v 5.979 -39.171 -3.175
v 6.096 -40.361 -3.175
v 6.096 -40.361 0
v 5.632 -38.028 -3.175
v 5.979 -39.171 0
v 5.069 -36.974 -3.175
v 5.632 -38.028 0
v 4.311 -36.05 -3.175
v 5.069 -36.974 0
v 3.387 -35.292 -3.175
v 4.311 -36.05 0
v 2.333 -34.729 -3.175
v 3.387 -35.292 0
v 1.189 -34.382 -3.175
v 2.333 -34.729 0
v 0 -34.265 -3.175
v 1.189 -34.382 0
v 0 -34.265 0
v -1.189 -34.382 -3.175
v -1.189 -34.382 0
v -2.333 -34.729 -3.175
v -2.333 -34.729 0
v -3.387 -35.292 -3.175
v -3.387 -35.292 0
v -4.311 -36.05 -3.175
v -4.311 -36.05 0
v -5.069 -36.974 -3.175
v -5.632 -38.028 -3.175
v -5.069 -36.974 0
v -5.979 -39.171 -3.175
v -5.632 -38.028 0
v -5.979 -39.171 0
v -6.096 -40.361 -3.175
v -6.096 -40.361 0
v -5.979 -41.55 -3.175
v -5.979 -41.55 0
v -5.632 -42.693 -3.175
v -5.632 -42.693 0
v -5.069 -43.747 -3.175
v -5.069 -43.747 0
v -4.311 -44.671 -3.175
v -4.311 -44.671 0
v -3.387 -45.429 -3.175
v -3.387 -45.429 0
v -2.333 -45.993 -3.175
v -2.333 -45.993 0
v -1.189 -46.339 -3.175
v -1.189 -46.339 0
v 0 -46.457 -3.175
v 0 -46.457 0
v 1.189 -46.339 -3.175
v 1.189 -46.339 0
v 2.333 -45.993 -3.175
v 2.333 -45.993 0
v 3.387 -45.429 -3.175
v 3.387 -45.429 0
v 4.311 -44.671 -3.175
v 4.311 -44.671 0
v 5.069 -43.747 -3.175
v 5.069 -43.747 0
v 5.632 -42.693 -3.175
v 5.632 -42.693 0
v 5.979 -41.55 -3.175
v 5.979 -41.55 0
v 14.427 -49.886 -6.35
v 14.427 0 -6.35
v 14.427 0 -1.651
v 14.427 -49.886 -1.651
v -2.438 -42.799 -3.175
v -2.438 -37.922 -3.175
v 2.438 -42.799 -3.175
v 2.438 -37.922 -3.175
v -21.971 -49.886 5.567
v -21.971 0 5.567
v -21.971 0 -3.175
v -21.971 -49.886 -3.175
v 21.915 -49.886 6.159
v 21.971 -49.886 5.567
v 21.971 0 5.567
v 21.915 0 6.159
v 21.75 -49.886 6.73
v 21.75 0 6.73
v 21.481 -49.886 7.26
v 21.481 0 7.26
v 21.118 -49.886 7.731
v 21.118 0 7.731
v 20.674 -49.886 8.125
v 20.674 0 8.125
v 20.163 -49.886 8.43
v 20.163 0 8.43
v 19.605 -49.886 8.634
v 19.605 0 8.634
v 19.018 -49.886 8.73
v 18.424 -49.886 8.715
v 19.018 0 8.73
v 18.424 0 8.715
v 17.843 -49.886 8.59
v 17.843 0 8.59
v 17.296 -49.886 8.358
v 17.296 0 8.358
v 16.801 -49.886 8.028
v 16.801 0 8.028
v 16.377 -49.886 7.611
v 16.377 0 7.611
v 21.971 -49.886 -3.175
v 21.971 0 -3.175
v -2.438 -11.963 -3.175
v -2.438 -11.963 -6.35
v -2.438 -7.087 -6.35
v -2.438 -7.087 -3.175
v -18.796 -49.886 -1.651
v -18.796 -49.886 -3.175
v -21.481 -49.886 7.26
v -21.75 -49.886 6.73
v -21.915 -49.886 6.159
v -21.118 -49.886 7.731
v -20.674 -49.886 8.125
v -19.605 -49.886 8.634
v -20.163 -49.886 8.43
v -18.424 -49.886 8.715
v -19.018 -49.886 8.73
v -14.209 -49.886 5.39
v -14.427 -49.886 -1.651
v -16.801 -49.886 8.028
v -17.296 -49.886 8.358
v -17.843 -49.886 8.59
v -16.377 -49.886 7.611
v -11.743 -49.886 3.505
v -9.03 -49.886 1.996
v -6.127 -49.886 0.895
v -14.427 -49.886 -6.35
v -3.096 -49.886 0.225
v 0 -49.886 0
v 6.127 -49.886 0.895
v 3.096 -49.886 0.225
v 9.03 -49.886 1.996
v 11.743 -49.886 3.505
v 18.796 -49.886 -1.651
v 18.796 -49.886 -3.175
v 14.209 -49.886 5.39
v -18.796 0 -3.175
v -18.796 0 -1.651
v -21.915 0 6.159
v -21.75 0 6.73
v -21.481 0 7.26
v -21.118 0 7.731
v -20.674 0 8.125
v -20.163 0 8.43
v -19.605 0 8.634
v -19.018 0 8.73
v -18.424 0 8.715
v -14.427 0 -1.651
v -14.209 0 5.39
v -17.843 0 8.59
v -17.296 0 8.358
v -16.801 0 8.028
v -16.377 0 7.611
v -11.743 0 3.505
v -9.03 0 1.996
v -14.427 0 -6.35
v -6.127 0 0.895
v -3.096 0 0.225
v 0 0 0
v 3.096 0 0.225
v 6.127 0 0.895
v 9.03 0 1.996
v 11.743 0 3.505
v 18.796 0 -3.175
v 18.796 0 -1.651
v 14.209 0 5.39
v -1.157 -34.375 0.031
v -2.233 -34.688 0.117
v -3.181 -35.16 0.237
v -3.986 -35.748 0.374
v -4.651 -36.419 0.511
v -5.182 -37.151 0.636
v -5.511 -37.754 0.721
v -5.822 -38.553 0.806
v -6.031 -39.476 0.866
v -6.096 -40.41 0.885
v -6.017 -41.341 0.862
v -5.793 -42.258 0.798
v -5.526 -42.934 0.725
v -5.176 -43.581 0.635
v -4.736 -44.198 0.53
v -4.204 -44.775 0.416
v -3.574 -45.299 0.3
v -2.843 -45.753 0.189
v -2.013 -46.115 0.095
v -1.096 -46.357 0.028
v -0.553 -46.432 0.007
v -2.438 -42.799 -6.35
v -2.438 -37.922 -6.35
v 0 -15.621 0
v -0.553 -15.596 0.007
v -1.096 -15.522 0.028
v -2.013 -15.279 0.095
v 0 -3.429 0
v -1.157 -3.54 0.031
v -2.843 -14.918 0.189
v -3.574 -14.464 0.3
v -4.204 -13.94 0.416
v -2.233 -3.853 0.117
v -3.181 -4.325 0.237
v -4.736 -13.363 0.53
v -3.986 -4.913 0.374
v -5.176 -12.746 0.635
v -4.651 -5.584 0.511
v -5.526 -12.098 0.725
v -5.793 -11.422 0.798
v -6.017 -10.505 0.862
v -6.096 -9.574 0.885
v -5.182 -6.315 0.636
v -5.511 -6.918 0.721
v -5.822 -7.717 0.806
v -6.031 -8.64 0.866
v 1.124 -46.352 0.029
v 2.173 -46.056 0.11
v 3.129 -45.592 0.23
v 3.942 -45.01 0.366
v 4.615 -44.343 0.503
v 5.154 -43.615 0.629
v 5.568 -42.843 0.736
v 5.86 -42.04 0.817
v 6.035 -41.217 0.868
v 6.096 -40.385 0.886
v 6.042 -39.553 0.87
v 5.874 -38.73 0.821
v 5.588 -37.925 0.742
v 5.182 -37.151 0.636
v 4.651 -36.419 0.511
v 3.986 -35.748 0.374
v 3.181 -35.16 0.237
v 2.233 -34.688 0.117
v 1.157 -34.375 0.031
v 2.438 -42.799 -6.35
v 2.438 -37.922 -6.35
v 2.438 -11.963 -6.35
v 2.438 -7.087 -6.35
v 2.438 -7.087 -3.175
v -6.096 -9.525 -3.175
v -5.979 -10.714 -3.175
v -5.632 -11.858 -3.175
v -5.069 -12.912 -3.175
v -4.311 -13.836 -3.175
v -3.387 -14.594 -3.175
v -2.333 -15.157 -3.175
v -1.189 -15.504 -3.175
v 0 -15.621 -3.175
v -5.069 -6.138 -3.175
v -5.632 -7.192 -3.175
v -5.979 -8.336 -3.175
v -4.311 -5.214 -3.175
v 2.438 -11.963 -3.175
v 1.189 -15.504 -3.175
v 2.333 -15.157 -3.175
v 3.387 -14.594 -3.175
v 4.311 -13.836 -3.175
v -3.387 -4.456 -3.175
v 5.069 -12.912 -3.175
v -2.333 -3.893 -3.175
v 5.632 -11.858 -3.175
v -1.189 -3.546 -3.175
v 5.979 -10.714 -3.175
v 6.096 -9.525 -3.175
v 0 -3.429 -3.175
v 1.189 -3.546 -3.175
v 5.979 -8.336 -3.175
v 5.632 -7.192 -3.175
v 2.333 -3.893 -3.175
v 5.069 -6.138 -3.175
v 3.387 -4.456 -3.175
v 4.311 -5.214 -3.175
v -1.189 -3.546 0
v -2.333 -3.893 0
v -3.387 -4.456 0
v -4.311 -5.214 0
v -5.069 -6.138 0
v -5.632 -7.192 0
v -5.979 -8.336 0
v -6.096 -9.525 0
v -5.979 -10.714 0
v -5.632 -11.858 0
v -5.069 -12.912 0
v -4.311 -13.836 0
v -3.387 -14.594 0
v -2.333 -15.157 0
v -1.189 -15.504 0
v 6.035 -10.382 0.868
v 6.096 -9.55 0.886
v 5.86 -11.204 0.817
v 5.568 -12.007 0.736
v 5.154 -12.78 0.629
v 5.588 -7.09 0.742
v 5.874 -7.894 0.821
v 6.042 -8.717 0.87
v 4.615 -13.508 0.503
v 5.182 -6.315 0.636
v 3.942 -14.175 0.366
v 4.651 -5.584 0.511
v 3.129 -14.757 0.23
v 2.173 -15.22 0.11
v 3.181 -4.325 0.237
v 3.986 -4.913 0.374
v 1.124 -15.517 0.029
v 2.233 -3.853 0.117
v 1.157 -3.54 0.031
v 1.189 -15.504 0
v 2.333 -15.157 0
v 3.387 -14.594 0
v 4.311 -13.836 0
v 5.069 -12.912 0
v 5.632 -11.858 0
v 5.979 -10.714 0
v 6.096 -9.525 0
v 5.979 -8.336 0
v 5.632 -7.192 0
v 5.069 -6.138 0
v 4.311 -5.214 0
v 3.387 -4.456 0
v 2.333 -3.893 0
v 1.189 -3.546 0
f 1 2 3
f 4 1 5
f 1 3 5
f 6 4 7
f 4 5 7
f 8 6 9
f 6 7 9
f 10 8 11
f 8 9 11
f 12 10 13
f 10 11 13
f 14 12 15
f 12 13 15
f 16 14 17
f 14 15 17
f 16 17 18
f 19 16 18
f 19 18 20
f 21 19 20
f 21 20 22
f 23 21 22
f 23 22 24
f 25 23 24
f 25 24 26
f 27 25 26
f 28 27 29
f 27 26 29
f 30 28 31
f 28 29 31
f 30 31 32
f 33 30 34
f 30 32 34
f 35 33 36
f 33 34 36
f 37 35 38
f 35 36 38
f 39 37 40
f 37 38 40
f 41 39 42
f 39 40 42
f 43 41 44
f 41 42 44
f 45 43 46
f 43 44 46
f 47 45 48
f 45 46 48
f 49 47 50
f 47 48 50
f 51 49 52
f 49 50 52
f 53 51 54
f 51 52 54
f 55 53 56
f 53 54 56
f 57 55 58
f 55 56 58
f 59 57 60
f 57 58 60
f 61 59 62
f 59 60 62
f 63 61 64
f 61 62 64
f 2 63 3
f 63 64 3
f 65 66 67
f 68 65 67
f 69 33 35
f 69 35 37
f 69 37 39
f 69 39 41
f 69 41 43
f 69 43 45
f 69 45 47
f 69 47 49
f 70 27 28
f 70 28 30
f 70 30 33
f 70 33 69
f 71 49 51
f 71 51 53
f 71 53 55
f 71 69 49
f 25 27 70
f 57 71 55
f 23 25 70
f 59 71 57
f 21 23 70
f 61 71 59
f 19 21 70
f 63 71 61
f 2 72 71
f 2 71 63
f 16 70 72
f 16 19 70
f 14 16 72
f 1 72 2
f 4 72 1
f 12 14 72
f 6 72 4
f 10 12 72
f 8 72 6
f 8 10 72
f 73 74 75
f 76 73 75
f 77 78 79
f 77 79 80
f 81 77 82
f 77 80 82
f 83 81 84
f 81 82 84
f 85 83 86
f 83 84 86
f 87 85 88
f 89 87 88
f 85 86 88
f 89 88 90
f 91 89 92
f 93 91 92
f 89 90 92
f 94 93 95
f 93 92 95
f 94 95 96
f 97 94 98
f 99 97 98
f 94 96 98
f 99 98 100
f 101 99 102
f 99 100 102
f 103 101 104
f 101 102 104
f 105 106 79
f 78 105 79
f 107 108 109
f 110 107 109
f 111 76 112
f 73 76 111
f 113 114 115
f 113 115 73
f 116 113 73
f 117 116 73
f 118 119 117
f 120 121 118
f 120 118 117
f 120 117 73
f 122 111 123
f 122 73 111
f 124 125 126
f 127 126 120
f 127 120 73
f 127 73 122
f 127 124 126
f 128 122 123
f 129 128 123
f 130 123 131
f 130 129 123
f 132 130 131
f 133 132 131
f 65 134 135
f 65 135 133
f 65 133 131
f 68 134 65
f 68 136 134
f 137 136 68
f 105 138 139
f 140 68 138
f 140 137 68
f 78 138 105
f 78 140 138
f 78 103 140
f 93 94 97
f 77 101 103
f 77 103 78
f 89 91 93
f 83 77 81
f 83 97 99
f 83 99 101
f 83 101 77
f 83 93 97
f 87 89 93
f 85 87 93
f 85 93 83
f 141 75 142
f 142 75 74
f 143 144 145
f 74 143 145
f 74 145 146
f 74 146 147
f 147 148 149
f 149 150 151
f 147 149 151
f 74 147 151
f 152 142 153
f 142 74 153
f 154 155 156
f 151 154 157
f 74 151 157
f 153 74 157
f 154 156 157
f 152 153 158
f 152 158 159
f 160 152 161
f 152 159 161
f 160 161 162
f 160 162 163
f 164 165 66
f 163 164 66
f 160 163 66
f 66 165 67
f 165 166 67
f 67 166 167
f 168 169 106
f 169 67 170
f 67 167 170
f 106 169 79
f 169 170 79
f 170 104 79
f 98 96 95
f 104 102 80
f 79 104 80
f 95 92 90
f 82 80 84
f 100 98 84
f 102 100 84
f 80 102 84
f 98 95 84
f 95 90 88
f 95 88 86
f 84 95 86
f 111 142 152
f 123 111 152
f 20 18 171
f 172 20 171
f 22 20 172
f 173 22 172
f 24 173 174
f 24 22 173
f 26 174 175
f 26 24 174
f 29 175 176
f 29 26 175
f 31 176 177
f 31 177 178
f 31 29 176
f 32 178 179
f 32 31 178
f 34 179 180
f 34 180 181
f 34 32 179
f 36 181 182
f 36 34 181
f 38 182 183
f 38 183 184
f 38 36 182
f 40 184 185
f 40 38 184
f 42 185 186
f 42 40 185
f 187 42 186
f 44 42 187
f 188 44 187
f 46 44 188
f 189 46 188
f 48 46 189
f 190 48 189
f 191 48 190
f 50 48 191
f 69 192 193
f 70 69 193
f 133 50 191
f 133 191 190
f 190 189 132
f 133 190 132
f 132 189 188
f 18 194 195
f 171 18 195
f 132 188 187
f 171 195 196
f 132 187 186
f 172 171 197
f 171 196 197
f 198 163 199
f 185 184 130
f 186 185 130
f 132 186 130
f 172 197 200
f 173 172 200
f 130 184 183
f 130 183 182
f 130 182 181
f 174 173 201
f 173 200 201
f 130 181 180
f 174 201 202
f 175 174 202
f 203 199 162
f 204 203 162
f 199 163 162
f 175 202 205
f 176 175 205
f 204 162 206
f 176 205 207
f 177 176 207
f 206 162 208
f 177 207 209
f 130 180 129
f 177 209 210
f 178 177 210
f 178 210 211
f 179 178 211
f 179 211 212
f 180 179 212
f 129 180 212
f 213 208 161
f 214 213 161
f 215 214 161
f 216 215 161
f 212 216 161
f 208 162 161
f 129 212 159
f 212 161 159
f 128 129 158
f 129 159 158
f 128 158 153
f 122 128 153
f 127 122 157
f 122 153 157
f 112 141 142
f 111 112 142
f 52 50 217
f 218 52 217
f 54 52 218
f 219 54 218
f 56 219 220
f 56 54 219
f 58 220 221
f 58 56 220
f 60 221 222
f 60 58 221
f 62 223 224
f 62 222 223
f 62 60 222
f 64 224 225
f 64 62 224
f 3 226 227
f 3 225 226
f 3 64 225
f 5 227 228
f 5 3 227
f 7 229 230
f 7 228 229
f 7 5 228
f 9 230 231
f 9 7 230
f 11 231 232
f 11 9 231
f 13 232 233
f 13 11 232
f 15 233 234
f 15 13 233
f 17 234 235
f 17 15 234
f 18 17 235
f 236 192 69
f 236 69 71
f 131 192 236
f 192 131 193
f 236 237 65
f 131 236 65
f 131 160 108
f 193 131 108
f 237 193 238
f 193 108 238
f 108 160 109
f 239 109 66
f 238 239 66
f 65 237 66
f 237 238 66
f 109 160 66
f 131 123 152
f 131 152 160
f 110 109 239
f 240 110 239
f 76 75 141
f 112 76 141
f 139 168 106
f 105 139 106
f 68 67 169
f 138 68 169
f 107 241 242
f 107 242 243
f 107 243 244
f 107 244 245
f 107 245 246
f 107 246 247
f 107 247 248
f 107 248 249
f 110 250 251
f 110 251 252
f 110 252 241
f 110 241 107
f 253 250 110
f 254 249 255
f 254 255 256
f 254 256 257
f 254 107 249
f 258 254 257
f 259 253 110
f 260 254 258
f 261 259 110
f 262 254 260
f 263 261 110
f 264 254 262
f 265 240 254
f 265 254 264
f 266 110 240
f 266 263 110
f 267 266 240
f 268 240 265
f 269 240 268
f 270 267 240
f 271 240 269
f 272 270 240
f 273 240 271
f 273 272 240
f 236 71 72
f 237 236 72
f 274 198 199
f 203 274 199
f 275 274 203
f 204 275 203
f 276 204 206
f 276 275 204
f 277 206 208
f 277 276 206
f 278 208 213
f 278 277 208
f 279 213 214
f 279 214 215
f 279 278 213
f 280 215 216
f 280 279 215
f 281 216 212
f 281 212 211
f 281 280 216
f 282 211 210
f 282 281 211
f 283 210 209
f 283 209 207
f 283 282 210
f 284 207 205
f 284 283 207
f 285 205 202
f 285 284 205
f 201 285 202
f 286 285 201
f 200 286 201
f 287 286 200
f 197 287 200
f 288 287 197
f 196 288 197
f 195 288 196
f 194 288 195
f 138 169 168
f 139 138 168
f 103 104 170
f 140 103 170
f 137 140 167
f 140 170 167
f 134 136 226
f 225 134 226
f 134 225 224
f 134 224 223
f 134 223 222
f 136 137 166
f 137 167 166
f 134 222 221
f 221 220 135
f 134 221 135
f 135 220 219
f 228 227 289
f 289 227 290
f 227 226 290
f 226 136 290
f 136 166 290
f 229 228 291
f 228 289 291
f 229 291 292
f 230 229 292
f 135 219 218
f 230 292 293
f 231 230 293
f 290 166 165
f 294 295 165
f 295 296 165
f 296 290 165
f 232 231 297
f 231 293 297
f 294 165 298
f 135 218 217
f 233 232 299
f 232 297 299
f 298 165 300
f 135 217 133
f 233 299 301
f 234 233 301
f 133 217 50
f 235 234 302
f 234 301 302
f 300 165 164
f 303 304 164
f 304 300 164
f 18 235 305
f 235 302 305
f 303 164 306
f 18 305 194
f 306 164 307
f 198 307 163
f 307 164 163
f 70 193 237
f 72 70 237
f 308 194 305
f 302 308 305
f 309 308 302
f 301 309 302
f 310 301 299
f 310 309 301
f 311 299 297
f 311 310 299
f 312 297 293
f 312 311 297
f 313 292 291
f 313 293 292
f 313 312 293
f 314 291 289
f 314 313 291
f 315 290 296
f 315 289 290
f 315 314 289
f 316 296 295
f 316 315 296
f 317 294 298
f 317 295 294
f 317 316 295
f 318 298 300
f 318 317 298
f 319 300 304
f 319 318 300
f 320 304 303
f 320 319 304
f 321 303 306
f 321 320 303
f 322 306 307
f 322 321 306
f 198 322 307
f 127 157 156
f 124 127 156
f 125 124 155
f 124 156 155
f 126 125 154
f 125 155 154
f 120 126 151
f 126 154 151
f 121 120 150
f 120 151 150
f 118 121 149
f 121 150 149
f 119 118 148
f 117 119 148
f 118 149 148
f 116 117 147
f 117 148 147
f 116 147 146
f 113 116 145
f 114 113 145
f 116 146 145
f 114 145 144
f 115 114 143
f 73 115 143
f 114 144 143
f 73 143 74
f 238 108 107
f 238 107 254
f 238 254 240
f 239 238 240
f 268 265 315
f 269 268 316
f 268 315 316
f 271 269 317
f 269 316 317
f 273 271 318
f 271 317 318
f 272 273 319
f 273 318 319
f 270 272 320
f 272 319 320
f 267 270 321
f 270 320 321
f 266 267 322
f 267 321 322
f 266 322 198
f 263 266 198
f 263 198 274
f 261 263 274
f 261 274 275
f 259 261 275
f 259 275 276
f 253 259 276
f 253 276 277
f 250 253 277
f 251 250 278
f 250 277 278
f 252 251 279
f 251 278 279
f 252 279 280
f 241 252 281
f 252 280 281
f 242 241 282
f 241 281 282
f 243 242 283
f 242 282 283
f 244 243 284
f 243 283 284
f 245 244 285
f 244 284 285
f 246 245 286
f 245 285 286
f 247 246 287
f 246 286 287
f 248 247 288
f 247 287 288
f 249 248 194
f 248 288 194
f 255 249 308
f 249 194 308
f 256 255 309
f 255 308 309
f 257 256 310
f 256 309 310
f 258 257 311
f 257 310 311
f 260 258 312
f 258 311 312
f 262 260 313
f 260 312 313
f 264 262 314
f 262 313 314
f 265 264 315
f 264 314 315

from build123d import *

# Parameters (mm, degrees)
F1_DEPTH      = 49.8856
F2_W          = 4.8768
F2_H          = 4.8768
F3_DEPTH      = 25.4
F3_DEPTH_BACK = 25.4
F2_R          = 6.096
F4_DEPTH      = 8.7386
F4_DEPTH_BACK = 3.175


with BuildPart() as f1:
    # F0 (on Front) → F1 (new body)
    with BuildSketch(Plane.XZ):
        with BuildLine():
            Line((-21.971, 5.567192), (-21.971, -3.175))
            Line((-21.971, -3.175), (-18.796, -3.175))
            Line((-18.796, -3.175), (-18.796, -1.651))
            Line((-18.796, -1.651), (-14.4272, -1.651))
            Line((-14.4272, -1.651), (-14.4272, -6.35))
            Line((-14.4272, -6.35), (0, -6.35))
            Line((0, -6.35), (14.4272, -6.35))
            Line((14.4272, -6.35), (14.4272, -1.651))
            Line((14.4272, -1.651), (18.796, -1.651))
            Line((18.796, -1.651), (18.796, -3.175))
            Line((18.796, -3.175), (21.971, -3.175))
            Line((21.971, -3.175), (21.971, 5.567192))
            ThreePointArc((21.971, 5.567192), (19.888745, 8.545012), (16.37714, 7.611298))
            ThreePointArc((16.37714, 7.611298), (9.029709, 1.99578), (0, 0))
            ThreePointArc((0, 0), (-9.029709, 1.99578), (-16.37714, 7.611298))
            ThreePointArc((-16.37714, 7.611298), (-19.888745, 8.545012), (-21.971, 5.567192))
        make_face()
    extrude(amount=F1_DEPTH)

    # F2 (on Top) → F3 (cut, two sides)
    with BuildSketch(Plane.XY) as f3_sk:
        with Locations((0, -9.525)):
            Rectangle(F2_W, F2_H)
        with Locations((0, -40.3606)):
            Rectangle(F2_W, F2_H)
    extrude(amount=F3_DEPTH, mode=Mode.SUBTRACT)
    extrude(f3_sk.sketch, amount=-F3_DEPTH_BACK, mode=Mode.SUBTRACT)

    # F2 (on Top) → F4 (cut, two sides)
    with BuildSketch(Plane.XY) as f4_sk:
        with Locations((0, -40.3606)):
            Circle(F2_R)
        with Locations((0, -40.3606)):
            Rectangle(F2_W, F2_H, mode=Mode.SUBTRACT)
        with Locations((0, -9.525)):
            Circle(F2_R)
        with Locations((0, -9.525)):
            Rectangle(F2_W, F2_H, mode=Mode.SUBTRACT)
        with Locations((0, -40.3606)):
            Rectangle(F2_W, F2_H)
        with Locations((0, -9.525)):
            Rectangle(F2_W, F2_H)
    extrude(amount=F4_DEPTH, mode=Mode.SUBTRACT)
    extrude(f4_sk.sketch, amount=-F4_DEPTH_BACK, mode=Mode.SUBTRACT)


solid = f1.part
